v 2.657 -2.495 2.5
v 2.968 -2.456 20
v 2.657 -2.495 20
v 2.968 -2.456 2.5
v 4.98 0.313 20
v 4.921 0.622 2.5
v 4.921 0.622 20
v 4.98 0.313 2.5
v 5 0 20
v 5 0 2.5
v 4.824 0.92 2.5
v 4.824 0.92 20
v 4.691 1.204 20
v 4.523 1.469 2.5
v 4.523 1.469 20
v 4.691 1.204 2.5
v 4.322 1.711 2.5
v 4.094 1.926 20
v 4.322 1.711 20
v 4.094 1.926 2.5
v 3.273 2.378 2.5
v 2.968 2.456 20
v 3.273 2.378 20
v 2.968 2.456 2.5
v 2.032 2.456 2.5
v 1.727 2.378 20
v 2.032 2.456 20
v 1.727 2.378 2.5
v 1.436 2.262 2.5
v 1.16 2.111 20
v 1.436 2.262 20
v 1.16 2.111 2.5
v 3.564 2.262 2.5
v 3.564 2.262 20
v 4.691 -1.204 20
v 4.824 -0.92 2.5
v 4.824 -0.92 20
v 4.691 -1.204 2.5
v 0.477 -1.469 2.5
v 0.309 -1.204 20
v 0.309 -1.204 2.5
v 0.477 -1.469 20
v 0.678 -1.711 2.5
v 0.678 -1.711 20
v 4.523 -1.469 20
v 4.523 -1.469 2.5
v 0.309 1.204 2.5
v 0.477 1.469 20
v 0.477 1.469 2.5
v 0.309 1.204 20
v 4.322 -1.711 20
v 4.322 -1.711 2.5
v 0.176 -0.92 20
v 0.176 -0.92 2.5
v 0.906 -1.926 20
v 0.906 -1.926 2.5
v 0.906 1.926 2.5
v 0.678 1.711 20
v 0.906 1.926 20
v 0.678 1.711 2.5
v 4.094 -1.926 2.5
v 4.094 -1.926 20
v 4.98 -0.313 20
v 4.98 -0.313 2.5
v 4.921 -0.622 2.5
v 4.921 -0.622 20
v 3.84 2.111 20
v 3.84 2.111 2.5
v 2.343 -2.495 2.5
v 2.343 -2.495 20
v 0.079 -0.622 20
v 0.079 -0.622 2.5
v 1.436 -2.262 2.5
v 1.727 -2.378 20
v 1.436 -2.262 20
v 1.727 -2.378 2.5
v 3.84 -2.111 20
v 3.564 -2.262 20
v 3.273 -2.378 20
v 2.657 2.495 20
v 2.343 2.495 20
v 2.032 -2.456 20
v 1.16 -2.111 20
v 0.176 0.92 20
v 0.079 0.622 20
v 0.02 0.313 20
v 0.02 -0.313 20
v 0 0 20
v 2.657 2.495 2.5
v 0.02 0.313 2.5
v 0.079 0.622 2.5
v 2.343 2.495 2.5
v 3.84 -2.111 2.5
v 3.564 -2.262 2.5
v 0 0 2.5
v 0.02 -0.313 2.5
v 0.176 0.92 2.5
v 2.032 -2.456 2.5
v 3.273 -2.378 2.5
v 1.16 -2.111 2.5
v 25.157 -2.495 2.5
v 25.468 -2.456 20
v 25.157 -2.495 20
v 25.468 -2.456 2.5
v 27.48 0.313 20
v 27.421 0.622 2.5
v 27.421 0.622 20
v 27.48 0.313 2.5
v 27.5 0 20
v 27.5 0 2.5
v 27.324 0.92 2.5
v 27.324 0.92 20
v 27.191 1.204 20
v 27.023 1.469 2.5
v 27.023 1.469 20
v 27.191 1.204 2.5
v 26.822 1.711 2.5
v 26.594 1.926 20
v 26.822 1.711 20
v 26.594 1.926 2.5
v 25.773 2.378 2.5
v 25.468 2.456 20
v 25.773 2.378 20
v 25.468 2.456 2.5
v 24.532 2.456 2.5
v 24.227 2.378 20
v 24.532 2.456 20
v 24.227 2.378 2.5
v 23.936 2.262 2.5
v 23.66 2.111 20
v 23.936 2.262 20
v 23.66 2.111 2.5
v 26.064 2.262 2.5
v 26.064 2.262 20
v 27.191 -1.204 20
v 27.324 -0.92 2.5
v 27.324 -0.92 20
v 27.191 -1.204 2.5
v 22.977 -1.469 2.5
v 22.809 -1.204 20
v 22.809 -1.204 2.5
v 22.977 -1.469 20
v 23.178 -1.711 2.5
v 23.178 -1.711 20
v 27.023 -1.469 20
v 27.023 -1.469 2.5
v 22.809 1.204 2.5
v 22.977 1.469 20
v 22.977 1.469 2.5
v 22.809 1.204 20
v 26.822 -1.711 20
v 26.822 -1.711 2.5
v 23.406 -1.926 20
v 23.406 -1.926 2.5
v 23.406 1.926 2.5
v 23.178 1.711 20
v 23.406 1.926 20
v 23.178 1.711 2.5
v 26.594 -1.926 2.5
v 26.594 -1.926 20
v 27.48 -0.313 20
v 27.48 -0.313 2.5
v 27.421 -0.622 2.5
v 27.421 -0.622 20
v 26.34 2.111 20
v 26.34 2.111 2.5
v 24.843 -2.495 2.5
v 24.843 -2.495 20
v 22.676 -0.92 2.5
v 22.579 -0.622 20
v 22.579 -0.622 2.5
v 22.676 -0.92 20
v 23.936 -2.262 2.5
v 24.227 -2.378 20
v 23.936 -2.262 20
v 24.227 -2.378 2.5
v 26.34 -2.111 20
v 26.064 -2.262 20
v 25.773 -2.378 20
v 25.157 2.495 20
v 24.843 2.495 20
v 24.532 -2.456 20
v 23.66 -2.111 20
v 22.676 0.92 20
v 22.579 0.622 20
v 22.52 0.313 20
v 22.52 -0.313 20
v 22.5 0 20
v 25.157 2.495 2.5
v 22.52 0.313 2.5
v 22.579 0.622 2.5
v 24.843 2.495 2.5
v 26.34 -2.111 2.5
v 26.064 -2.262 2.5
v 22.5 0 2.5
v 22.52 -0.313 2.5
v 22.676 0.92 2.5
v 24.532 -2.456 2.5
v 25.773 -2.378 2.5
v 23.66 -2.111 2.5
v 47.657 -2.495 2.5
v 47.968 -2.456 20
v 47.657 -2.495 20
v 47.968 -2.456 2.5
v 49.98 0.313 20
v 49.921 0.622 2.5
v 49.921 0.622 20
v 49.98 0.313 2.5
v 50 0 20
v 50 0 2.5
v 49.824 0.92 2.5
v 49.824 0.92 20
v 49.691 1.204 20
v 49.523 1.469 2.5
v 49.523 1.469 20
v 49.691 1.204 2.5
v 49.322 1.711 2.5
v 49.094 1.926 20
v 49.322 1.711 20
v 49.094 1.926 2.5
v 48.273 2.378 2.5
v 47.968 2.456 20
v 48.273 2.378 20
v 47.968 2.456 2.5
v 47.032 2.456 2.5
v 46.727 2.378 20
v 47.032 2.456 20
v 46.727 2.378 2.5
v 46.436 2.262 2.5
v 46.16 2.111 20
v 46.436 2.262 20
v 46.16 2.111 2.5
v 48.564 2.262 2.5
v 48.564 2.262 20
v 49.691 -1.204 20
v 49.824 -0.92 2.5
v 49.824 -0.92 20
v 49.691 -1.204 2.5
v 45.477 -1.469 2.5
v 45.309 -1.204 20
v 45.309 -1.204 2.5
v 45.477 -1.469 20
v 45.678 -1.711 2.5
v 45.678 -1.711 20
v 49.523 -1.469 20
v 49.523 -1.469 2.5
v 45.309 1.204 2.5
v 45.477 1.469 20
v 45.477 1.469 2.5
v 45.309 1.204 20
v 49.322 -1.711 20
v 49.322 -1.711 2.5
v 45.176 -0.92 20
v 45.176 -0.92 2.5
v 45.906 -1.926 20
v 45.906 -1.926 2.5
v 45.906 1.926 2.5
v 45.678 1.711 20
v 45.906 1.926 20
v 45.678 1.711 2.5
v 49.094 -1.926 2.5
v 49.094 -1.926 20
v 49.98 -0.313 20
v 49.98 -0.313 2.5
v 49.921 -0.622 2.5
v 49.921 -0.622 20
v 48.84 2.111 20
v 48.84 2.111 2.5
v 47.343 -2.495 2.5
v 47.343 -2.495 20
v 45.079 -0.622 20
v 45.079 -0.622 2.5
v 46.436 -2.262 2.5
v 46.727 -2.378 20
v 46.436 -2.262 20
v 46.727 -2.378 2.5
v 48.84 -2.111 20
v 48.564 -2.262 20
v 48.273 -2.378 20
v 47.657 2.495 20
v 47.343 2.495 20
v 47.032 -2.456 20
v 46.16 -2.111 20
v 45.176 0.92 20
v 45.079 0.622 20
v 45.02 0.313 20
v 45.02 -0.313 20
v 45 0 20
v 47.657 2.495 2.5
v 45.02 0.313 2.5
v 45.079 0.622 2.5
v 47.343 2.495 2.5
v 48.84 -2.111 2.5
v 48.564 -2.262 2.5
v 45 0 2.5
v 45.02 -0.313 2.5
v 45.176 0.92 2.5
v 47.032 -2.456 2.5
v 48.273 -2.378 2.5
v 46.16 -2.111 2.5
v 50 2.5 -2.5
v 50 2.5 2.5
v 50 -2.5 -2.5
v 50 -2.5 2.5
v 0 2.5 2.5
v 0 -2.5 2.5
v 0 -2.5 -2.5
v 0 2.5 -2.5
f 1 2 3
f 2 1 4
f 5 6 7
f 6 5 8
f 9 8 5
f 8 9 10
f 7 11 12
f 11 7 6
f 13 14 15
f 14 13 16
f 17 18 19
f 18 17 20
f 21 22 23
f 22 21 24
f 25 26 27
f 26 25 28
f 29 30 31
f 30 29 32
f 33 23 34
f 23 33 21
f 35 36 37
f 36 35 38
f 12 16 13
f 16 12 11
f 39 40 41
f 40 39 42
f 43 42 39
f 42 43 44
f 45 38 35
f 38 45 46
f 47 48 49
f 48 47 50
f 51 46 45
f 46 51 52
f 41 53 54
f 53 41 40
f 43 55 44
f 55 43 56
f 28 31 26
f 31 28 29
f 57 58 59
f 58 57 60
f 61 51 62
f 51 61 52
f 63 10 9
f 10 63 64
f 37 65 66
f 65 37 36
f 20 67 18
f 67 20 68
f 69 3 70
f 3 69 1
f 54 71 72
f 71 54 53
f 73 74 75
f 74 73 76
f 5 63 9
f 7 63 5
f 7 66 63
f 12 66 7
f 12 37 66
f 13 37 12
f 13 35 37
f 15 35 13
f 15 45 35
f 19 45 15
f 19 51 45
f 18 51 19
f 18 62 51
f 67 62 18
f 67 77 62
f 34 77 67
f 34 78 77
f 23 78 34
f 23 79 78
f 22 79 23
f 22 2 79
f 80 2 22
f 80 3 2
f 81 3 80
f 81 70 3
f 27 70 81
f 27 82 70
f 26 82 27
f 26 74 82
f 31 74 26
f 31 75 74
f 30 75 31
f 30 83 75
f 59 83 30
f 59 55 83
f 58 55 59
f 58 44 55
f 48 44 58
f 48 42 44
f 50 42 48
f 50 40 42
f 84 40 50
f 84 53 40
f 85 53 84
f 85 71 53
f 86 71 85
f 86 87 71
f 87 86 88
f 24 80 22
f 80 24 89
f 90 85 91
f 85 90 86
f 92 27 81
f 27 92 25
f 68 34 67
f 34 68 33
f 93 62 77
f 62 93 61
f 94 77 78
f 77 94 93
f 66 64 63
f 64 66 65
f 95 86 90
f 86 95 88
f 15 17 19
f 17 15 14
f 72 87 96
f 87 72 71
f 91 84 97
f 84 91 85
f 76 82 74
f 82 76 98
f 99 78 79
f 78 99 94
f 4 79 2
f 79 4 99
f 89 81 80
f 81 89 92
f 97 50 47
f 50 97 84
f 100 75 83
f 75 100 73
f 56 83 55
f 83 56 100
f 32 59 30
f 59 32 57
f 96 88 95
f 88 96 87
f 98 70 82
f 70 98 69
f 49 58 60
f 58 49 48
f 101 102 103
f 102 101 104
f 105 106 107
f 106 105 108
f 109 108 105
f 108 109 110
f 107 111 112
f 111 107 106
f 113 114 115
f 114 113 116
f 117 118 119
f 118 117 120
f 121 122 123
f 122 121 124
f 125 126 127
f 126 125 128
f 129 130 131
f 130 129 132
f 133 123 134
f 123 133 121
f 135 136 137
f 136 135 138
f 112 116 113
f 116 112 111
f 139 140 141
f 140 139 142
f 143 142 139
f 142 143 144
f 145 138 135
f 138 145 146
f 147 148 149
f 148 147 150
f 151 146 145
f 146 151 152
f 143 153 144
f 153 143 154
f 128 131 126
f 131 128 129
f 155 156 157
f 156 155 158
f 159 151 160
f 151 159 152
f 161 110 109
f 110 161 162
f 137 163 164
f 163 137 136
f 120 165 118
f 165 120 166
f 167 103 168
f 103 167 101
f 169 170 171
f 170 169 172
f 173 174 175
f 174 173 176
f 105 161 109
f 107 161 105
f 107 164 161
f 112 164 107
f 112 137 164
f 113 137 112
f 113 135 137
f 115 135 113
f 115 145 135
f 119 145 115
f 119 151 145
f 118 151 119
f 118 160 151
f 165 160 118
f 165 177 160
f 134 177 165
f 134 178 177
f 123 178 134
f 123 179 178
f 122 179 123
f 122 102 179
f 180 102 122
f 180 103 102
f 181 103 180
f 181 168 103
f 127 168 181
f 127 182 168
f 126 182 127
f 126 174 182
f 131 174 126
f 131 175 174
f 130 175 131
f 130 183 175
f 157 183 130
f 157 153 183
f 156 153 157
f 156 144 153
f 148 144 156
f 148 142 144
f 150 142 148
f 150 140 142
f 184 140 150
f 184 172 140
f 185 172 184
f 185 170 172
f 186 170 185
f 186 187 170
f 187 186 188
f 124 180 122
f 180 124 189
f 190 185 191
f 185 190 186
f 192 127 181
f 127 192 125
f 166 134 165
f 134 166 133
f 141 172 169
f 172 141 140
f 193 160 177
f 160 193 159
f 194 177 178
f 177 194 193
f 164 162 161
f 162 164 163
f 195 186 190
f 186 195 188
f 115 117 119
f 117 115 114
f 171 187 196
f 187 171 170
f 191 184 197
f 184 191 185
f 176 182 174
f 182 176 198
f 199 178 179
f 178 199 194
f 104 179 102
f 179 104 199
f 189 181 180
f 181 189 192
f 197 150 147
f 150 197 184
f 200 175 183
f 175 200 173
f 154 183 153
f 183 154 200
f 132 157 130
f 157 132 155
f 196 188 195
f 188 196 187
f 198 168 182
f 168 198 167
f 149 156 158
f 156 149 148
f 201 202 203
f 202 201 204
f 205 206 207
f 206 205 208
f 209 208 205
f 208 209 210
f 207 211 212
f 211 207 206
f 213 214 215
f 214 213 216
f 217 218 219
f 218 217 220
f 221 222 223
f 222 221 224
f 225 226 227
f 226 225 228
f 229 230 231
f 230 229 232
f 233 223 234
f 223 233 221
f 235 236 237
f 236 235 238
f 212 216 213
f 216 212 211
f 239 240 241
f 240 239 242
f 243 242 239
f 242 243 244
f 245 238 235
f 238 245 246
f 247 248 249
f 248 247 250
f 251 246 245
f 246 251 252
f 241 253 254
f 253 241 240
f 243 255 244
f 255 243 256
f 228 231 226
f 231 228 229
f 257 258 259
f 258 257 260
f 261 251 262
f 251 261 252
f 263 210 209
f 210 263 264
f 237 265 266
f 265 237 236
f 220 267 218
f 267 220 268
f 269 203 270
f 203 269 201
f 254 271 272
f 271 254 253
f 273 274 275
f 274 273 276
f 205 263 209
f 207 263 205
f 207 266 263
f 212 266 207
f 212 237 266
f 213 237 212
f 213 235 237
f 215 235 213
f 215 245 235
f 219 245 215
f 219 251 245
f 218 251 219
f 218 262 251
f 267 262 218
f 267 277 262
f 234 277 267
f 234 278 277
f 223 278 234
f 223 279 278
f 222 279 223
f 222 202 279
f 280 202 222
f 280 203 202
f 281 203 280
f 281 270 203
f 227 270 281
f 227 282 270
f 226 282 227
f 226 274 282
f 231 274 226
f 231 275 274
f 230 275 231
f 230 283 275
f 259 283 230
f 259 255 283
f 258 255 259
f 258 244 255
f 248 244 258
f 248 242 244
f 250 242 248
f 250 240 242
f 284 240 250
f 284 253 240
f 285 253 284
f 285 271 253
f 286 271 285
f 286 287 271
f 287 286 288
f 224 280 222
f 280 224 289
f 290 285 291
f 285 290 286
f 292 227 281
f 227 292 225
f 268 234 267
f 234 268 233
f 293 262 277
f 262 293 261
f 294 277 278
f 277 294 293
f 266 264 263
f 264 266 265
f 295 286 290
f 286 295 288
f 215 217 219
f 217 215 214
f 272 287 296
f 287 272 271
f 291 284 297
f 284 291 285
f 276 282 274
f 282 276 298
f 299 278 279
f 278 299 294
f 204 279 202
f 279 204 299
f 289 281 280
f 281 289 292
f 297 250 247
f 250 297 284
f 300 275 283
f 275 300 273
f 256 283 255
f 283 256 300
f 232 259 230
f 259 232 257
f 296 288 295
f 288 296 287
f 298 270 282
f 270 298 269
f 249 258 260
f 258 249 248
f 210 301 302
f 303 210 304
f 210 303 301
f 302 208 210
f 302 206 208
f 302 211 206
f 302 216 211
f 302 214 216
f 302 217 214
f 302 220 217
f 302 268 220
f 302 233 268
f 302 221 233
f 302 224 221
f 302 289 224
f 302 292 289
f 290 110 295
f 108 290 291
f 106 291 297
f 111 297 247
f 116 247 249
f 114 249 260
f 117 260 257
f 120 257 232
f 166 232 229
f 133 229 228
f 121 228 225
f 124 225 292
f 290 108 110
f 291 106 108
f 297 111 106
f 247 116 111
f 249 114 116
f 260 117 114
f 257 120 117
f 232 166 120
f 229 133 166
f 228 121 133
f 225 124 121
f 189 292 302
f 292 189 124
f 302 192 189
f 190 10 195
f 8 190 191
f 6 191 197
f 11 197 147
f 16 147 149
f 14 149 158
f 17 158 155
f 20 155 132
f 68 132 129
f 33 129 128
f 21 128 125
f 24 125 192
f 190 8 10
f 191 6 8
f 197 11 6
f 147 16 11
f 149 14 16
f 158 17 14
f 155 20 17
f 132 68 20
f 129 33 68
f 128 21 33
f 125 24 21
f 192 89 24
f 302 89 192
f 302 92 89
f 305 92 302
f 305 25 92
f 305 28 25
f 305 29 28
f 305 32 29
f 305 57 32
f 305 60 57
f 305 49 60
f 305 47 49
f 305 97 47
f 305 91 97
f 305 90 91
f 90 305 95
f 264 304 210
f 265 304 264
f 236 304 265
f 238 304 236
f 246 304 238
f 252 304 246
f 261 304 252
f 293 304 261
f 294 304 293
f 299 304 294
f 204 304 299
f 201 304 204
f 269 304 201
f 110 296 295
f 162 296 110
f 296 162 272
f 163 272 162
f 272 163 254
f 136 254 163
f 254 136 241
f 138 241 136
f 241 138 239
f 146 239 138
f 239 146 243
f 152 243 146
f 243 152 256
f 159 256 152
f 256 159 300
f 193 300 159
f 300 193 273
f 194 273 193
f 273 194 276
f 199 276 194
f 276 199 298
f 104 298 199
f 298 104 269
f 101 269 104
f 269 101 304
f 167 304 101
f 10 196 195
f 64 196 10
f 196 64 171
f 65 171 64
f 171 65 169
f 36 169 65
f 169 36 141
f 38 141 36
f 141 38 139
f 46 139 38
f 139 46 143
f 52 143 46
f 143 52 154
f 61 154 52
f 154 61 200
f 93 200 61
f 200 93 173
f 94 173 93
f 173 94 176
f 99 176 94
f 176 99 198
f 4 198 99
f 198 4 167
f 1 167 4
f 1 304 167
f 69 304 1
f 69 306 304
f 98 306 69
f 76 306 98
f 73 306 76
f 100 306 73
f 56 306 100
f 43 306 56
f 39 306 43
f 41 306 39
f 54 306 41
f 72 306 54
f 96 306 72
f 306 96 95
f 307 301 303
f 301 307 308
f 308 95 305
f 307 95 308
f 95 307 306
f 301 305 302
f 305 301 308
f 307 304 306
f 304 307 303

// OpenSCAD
height = 25;
width = 50;
thickness = 5;

$fn=50;

translate([thickness/2,0,0]) cylinder(r=thickness/2, h=height-thickness);
translate([width/2,0,0]) cylinder(r=thickness/2, h=height-thickness);
translate([width-thickness/2,0,0]) cylinder(r=thickness/2, h=height-thickness);

translate([0,-thickness/2,-thickness/2]) cube([width,thickness,thickness]);
